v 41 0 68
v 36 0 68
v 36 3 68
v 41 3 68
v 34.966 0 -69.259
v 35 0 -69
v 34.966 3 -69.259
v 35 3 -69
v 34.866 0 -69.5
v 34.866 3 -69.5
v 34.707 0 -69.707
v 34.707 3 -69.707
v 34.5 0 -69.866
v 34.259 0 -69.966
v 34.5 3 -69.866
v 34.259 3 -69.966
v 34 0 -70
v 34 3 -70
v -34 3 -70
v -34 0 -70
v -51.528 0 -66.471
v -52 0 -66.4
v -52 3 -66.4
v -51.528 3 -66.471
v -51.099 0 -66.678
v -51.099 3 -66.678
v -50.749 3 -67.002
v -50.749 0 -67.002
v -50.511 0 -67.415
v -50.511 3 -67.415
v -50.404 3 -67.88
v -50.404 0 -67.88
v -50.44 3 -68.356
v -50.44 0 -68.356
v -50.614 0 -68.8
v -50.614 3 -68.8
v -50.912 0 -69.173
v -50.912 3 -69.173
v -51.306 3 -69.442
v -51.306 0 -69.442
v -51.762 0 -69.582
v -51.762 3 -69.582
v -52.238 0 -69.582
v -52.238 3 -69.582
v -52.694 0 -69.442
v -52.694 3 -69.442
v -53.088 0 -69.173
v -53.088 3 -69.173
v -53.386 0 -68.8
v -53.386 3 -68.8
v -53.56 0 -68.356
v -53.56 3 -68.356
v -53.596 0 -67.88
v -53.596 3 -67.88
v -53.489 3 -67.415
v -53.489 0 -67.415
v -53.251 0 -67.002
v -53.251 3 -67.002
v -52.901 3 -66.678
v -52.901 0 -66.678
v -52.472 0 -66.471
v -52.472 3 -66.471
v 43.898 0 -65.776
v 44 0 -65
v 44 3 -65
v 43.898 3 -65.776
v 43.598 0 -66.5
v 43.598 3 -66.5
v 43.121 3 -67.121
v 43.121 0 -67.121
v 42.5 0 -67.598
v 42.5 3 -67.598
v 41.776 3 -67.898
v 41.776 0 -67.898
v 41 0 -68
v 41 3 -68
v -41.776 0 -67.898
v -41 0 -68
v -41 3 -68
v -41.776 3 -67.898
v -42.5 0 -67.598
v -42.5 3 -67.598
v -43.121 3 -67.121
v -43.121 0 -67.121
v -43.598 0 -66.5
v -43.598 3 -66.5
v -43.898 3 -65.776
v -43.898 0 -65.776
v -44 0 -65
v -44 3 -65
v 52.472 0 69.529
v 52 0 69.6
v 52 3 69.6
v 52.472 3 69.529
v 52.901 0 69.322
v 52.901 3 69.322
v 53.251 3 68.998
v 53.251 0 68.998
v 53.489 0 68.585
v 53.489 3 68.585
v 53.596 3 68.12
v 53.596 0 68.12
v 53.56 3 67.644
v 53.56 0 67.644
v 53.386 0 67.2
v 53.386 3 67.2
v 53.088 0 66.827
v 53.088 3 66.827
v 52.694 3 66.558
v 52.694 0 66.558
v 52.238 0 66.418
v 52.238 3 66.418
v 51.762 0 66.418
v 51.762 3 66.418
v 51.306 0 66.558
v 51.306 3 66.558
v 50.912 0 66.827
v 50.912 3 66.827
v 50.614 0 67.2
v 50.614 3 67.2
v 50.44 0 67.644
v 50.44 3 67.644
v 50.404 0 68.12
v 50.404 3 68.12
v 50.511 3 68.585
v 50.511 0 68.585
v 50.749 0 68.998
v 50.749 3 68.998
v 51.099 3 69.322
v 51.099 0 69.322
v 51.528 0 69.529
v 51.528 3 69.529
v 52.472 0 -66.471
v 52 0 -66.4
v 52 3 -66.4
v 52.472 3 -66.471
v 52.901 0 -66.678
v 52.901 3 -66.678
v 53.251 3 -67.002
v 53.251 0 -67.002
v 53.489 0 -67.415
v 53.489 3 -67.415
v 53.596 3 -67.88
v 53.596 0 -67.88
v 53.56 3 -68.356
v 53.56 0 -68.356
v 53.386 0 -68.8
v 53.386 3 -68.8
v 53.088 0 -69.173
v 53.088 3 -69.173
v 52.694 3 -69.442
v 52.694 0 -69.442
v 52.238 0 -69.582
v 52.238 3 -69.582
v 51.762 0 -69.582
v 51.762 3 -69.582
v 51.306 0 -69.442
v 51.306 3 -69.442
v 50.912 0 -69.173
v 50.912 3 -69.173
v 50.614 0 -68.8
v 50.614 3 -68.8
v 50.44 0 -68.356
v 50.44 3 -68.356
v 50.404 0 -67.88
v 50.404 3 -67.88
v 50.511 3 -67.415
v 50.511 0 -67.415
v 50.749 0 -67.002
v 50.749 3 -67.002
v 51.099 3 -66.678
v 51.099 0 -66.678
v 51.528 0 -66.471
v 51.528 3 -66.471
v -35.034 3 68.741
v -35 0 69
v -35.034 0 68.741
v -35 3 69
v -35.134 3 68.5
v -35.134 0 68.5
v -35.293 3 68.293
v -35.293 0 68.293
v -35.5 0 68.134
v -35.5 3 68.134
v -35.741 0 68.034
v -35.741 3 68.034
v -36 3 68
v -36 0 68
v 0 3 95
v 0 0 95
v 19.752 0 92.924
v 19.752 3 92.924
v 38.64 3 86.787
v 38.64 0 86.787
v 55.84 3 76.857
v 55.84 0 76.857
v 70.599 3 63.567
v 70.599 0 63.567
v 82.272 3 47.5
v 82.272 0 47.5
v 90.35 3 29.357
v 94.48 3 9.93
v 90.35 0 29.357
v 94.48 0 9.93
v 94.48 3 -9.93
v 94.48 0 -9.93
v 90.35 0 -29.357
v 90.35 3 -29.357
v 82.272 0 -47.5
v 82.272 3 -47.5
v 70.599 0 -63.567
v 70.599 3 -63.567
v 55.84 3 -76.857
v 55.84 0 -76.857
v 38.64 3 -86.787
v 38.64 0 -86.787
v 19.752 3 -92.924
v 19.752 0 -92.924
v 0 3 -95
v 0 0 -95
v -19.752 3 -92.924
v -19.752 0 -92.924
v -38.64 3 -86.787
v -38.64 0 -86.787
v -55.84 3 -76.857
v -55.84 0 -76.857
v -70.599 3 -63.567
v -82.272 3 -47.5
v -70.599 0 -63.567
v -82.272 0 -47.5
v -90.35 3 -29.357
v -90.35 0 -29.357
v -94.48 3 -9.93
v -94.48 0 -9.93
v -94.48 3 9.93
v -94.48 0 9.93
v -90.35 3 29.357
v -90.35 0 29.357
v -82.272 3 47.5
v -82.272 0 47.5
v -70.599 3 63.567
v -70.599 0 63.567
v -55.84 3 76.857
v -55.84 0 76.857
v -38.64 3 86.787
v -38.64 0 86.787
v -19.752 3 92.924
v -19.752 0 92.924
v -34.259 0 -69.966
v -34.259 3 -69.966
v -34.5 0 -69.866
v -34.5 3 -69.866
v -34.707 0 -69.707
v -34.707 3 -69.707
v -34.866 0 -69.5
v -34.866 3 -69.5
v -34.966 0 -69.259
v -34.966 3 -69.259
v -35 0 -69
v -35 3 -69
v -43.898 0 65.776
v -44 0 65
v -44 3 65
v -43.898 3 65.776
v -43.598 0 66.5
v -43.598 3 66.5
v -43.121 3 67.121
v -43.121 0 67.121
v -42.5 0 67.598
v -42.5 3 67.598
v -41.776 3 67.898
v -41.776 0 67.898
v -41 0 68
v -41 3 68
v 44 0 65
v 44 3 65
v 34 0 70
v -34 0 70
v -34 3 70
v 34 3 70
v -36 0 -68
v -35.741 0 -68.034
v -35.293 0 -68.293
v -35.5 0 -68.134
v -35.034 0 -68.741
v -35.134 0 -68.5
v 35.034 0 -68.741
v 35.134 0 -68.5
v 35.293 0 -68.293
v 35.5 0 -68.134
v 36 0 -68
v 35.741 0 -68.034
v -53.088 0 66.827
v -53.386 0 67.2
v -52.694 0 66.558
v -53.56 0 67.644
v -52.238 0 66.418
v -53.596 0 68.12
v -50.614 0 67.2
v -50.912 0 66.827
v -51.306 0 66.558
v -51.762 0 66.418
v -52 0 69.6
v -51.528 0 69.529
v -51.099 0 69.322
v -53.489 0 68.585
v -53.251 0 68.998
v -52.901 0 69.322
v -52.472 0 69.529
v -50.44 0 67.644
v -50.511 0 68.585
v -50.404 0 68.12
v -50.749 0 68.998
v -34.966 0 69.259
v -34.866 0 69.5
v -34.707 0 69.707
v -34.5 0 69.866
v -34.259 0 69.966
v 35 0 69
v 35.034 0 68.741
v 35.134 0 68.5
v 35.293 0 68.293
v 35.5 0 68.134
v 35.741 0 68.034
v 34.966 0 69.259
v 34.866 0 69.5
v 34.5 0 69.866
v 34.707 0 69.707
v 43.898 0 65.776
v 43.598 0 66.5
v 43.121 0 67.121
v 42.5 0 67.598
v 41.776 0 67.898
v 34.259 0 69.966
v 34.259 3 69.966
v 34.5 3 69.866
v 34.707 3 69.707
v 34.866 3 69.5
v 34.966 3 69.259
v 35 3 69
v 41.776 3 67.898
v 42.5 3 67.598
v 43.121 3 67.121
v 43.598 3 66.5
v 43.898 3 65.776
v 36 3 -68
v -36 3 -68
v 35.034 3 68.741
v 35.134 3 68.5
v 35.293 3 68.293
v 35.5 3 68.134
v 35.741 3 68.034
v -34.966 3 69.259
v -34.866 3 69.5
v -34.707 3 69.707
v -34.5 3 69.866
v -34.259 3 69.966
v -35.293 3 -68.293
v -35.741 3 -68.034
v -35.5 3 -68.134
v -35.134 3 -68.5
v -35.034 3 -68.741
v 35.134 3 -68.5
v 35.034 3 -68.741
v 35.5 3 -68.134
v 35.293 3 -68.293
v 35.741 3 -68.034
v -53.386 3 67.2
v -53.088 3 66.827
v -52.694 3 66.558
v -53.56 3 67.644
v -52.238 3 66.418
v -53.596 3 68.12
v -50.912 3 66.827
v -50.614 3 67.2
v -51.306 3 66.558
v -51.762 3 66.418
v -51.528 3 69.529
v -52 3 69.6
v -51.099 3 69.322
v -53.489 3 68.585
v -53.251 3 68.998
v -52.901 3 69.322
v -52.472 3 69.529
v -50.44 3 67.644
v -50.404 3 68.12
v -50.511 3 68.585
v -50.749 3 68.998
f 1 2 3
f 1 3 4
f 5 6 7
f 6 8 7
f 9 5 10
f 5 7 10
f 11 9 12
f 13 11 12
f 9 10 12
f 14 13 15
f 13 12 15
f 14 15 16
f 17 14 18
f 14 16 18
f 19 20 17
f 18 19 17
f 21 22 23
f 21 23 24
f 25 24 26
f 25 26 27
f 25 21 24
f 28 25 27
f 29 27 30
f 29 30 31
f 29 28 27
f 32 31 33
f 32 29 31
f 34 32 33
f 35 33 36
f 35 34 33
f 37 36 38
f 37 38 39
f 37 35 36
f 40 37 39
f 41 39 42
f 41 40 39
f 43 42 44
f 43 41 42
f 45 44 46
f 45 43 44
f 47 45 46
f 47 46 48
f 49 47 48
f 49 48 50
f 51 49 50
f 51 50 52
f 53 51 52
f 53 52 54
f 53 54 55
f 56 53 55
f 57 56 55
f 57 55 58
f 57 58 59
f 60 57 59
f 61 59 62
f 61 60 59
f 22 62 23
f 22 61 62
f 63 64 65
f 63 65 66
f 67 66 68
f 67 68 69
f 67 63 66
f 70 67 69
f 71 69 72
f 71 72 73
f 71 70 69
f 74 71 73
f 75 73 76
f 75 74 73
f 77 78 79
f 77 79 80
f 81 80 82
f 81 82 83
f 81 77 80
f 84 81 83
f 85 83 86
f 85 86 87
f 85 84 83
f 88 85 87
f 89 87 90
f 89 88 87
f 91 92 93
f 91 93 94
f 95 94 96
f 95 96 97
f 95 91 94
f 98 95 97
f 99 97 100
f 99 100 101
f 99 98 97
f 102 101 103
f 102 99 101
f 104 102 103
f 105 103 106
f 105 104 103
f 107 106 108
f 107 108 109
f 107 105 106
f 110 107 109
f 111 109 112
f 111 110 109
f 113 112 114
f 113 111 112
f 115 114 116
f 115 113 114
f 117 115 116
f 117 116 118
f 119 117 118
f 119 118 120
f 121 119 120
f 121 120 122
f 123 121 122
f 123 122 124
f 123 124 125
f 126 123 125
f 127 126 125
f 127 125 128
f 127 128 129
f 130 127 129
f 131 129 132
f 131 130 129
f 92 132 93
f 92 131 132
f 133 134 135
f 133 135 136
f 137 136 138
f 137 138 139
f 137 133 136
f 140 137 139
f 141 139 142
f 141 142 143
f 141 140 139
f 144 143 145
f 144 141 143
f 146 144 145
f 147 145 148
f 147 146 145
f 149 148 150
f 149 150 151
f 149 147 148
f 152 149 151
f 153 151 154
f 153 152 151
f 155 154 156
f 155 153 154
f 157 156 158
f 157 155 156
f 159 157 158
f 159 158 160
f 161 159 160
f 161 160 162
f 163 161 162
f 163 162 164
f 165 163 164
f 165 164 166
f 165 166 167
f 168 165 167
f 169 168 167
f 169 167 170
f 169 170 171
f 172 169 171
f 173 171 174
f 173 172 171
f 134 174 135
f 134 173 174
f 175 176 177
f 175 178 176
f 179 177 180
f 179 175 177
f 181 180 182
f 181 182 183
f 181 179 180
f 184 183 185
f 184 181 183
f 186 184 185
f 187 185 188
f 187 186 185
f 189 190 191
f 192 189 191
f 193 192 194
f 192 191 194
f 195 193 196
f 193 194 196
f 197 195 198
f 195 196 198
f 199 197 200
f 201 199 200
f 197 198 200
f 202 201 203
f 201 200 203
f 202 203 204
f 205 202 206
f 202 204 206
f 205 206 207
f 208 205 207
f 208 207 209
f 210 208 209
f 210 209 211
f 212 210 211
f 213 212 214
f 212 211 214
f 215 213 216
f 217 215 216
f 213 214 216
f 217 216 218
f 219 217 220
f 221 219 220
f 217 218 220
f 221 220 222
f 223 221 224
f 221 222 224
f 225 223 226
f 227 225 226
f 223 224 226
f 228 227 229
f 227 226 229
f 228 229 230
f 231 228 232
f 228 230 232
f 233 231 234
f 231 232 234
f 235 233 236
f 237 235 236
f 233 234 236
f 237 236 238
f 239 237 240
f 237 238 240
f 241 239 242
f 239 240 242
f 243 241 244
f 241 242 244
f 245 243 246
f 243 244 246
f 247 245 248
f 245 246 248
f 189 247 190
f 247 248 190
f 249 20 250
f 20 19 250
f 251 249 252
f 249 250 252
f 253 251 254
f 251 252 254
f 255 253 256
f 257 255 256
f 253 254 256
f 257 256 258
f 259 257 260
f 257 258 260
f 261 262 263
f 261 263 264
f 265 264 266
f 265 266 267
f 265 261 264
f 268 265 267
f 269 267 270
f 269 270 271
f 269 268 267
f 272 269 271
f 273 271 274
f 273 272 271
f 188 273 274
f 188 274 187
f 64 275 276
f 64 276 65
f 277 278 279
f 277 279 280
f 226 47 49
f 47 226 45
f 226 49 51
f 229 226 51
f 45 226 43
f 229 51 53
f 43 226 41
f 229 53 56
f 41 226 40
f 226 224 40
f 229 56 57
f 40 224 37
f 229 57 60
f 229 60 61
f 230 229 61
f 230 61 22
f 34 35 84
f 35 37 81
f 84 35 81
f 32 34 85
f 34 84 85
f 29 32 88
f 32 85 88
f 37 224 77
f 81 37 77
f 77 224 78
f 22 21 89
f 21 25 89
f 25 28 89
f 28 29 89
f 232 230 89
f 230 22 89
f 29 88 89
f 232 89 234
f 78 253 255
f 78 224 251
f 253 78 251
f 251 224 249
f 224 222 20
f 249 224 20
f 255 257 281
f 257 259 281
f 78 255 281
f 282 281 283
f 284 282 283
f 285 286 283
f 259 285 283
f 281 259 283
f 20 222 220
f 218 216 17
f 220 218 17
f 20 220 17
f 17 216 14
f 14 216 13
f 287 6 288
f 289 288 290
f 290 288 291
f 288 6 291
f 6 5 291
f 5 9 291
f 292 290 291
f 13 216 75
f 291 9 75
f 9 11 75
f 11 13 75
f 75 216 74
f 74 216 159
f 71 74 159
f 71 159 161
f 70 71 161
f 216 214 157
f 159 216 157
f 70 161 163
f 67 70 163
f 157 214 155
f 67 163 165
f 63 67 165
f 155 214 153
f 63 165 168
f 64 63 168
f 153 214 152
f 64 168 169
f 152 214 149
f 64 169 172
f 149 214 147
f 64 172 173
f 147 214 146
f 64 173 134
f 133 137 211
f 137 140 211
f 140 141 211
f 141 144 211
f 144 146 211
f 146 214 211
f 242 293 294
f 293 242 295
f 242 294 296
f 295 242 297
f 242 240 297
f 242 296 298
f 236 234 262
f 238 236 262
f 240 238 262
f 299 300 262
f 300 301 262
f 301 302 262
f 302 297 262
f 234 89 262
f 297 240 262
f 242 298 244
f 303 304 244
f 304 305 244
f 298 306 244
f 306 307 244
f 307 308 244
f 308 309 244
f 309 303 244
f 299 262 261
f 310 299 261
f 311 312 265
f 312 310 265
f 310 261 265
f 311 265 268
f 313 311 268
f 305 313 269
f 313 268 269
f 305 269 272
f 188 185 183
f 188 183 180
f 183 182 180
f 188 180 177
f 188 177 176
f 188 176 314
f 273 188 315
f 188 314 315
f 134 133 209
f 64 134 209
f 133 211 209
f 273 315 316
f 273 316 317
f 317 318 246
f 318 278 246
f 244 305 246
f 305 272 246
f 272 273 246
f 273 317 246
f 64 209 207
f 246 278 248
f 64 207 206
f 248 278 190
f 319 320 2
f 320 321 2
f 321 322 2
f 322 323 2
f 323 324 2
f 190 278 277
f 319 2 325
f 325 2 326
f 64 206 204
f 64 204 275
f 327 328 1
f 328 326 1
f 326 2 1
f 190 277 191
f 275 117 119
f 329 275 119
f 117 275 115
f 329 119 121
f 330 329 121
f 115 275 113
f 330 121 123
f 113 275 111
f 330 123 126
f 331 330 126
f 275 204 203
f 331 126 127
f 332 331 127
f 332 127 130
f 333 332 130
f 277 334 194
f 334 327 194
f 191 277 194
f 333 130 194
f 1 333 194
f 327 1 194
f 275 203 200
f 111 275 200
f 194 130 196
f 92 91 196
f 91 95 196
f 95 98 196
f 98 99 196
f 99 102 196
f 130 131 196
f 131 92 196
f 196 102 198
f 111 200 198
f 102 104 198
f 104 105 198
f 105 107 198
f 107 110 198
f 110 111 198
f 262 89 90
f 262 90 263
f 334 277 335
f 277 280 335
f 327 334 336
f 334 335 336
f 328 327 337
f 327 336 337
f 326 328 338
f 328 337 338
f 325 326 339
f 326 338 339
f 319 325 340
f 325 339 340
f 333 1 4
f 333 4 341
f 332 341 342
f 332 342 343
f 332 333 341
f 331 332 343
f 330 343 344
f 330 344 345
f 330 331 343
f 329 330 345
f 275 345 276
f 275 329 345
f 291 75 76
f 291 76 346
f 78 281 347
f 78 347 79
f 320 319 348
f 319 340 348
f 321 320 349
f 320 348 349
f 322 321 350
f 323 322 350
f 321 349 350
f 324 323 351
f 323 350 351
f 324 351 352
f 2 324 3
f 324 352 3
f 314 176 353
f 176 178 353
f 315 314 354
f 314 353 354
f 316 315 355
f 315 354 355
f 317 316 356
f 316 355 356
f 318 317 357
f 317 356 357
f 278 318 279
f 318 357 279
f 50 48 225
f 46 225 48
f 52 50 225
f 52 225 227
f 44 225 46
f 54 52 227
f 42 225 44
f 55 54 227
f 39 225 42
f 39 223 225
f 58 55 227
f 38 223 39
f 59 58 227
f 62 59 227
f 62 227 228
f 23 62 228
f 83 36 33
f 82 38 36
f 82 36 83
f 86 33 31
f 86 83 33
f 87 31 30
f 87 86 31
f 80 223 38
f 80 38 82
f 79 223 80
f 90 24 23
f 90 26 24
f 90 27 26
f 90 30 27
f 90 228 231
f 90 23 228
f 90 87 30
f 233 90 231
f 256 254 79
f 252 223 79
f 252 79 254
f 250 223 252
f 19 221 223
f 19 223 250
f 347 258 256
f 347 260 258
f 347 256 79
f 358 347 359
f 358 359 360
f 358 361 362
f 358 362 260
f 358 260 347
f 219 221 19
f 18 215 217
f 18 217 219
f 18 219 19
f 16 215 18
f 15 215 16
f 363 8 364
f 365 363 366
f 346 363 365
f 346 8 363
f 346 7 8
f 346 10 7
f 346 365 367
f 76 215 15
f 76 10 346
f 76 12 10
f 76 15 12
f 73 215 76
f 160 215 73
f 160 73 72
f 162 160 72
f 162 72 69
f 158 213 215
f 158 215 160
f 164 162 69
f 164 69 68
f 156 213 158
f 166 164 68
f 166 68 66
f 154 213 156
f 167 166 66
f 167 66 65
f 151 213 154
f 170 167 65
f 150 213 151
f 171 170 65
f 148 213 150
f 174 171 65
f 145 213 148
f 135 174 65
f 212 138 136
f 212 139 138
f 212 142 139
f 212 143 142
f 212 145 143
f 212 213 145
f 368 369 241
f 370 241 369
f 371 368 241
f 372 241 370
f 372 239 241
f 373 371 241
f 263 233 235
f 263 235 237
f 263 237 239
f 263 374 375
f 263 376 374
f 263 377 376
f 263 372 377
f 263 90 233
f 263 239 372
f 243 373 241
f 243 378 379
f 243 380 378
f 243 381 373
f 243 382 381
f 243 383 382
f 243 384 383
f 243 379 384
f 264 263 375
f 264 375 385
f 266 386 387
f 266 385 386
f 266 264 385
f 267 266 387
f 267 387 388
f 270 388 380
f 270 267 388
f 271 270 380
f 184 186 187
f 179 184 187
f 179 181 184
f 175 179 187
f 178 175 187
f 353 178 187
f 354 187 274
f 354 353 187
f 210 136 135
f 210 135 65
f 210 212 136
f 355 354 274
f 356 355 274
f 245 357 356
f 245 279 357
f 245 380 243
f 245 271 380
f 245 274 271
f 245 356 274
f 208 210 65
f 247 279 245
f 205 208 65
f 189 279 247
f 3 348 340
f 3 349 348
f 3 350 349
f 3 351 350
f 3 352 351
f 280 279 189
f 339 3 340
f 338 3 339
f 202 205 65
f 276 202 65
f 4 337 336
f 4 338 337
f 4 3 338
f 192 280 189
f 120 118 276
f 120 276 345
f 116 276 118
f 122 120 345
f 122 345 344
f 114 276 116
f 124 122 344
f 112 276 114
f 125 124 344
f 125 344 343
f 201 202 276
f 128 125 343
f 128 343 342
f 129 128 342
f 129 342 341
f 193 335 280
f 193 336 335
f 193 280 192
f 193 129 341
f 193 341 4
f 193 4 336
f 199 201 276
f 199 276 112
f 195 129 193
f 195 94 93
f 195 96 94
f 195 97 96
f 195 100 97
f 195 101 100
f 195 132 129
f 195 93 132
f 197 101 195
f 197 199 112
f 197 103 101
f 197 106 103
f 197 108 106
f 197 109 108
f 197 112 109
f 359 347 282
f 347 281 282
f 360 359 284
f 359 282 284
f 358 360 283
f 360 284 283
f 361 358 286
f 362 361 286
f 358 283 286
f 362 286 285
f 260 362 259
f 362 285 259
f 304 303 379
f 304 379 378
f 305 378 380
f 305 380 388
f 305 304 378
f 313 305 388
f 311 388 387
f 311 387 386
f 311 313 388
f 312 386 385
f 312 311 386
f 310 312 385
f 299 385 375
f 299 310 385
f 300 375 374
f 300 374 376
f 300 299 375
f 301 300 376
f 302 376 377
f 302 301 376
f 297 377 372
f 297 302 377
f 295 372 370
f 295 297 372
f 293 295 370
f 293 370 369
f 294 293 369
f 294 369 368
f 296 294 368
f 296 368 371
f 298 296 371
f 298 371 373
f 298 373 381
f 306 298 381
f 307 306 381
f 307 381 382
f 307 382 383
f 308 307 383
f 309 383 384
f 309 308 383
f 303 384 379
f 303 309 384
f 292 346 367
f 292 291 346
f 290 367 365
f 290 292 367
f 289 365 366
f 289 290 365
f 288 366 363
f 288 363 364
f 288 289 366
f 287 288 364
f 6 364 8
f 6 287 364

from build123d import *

# Parameters (mm, degrees)
SKIZZE1_R                       = 95
SKIZZE1_R_2                     = 1.6
AUFSATZ_LINEAR_AUSTRAGEN1_DEPTH = 3
SKIZZE2_W                       = 70
SKIZZE2_H                       = 4
SCHNITT_LINEAR_AUSTRAGEN2_DEPTH = 3
VERRUNDUNG1_R                   = 1


with BuildPart() as part:
    # Skizze1 → Aufsatz-Linear austragen1 (new body)
    with BuildSketch(Plane(origin=(0, 0, 0), x_dir=(1, 0, 0), z_dir=(0, 1, 0))):
        with Locations(Location((0, 0, 0), (0, 0, 270))):
            Circle(SKIZZE1_R)
        with Locations(Location((-52, 68, 0), (0, 0, 270))):
            Circle(SKIZZE1_R_2, mode=Mode.SUBTRACT)
        with Locations(Location((52, 68, 0), (0, 0, 270))):
            Circle(SKIZZE1_R_2, mode=Mode.SUBTRACT)
        with Locations(Location((-52, -68, 0), (0, 0, 270))):
            Circle(SKIZZE1_R_2, mode=Mode.SUBTRACT)
        with Locations(Location((52, -68, 0), (0, 0, 270))):
            Circle(SKIZZE1_R_2, mode=Mode.SUBTRACT)
        with BuildLine():
            Line((-44, 65), (-44, -65))
            ThreePointArc((-44, -65), (-43.121320344, -67.121320344), (-41, -68))
            Line((-41, -68), (41, -68))
            ThreePointArc((41, -68), (43.121320344, -67.121320344), (44, -65))
            Line((44, -65), (44, 65))
            ThreePointArc((44, 65), (43.121320344, 67.121320344), (41, 68))
            Line((41, 68), (-41, 68))
            ThreePointArc((-41, 68), (-43.121320344, 67.121320344), (-44, 65))
        make_face(mode=Mode.SUBTRACT)
    extrude(amount=AUFSATZ_LINEAR_AUSTRAGEN1_DEPTH)

    # Skizze2 → Schnitt-Linear austragen2 (cut)
    with BuildSketch(Plane(origin=(0, 0, 0), x_dir=(1, 0, 0), z_dir=(0, 1, 0))):
        with Locations((0, -68)):
            Rectangle(SKIZZE2_W, SKIZZE2_H)
        with Locations((0, 68)):
            Rectangle(SKIZZE2_W, SKIZZE2_H)
    extrude(amount=SCHNITT_LINEAR_AUSTRAGEN2_DEPTH, mode=Mode.SUBTRACT)

    # Verrundung1
    verrundung1_edges = [part.edges().sort_by_distance(p)[0] for p in [
        (-35, 1.5, 70),
        (35, 1.5, 70),
        (35, 1.5, -70),
        (-35, 1.5, -70),
    ]]
    fillet(verrundung1_edges, radius=VERRUNDUNG1_R)
    verrundung1_2_edges = [part.edges().sort_by_distance(p)[0] for p in [
        (-35, 1.5, 68),
        (35, 1.5, 68),
        (35, 1.5, -68),
        (-35, 1.5, -68),
    ]]
    fillet(verrundung1_2_edges, radius=VERRUNDUNG1_R - 0.0001)  # a hair under: the kernel refuses the full size


solid = part.part
